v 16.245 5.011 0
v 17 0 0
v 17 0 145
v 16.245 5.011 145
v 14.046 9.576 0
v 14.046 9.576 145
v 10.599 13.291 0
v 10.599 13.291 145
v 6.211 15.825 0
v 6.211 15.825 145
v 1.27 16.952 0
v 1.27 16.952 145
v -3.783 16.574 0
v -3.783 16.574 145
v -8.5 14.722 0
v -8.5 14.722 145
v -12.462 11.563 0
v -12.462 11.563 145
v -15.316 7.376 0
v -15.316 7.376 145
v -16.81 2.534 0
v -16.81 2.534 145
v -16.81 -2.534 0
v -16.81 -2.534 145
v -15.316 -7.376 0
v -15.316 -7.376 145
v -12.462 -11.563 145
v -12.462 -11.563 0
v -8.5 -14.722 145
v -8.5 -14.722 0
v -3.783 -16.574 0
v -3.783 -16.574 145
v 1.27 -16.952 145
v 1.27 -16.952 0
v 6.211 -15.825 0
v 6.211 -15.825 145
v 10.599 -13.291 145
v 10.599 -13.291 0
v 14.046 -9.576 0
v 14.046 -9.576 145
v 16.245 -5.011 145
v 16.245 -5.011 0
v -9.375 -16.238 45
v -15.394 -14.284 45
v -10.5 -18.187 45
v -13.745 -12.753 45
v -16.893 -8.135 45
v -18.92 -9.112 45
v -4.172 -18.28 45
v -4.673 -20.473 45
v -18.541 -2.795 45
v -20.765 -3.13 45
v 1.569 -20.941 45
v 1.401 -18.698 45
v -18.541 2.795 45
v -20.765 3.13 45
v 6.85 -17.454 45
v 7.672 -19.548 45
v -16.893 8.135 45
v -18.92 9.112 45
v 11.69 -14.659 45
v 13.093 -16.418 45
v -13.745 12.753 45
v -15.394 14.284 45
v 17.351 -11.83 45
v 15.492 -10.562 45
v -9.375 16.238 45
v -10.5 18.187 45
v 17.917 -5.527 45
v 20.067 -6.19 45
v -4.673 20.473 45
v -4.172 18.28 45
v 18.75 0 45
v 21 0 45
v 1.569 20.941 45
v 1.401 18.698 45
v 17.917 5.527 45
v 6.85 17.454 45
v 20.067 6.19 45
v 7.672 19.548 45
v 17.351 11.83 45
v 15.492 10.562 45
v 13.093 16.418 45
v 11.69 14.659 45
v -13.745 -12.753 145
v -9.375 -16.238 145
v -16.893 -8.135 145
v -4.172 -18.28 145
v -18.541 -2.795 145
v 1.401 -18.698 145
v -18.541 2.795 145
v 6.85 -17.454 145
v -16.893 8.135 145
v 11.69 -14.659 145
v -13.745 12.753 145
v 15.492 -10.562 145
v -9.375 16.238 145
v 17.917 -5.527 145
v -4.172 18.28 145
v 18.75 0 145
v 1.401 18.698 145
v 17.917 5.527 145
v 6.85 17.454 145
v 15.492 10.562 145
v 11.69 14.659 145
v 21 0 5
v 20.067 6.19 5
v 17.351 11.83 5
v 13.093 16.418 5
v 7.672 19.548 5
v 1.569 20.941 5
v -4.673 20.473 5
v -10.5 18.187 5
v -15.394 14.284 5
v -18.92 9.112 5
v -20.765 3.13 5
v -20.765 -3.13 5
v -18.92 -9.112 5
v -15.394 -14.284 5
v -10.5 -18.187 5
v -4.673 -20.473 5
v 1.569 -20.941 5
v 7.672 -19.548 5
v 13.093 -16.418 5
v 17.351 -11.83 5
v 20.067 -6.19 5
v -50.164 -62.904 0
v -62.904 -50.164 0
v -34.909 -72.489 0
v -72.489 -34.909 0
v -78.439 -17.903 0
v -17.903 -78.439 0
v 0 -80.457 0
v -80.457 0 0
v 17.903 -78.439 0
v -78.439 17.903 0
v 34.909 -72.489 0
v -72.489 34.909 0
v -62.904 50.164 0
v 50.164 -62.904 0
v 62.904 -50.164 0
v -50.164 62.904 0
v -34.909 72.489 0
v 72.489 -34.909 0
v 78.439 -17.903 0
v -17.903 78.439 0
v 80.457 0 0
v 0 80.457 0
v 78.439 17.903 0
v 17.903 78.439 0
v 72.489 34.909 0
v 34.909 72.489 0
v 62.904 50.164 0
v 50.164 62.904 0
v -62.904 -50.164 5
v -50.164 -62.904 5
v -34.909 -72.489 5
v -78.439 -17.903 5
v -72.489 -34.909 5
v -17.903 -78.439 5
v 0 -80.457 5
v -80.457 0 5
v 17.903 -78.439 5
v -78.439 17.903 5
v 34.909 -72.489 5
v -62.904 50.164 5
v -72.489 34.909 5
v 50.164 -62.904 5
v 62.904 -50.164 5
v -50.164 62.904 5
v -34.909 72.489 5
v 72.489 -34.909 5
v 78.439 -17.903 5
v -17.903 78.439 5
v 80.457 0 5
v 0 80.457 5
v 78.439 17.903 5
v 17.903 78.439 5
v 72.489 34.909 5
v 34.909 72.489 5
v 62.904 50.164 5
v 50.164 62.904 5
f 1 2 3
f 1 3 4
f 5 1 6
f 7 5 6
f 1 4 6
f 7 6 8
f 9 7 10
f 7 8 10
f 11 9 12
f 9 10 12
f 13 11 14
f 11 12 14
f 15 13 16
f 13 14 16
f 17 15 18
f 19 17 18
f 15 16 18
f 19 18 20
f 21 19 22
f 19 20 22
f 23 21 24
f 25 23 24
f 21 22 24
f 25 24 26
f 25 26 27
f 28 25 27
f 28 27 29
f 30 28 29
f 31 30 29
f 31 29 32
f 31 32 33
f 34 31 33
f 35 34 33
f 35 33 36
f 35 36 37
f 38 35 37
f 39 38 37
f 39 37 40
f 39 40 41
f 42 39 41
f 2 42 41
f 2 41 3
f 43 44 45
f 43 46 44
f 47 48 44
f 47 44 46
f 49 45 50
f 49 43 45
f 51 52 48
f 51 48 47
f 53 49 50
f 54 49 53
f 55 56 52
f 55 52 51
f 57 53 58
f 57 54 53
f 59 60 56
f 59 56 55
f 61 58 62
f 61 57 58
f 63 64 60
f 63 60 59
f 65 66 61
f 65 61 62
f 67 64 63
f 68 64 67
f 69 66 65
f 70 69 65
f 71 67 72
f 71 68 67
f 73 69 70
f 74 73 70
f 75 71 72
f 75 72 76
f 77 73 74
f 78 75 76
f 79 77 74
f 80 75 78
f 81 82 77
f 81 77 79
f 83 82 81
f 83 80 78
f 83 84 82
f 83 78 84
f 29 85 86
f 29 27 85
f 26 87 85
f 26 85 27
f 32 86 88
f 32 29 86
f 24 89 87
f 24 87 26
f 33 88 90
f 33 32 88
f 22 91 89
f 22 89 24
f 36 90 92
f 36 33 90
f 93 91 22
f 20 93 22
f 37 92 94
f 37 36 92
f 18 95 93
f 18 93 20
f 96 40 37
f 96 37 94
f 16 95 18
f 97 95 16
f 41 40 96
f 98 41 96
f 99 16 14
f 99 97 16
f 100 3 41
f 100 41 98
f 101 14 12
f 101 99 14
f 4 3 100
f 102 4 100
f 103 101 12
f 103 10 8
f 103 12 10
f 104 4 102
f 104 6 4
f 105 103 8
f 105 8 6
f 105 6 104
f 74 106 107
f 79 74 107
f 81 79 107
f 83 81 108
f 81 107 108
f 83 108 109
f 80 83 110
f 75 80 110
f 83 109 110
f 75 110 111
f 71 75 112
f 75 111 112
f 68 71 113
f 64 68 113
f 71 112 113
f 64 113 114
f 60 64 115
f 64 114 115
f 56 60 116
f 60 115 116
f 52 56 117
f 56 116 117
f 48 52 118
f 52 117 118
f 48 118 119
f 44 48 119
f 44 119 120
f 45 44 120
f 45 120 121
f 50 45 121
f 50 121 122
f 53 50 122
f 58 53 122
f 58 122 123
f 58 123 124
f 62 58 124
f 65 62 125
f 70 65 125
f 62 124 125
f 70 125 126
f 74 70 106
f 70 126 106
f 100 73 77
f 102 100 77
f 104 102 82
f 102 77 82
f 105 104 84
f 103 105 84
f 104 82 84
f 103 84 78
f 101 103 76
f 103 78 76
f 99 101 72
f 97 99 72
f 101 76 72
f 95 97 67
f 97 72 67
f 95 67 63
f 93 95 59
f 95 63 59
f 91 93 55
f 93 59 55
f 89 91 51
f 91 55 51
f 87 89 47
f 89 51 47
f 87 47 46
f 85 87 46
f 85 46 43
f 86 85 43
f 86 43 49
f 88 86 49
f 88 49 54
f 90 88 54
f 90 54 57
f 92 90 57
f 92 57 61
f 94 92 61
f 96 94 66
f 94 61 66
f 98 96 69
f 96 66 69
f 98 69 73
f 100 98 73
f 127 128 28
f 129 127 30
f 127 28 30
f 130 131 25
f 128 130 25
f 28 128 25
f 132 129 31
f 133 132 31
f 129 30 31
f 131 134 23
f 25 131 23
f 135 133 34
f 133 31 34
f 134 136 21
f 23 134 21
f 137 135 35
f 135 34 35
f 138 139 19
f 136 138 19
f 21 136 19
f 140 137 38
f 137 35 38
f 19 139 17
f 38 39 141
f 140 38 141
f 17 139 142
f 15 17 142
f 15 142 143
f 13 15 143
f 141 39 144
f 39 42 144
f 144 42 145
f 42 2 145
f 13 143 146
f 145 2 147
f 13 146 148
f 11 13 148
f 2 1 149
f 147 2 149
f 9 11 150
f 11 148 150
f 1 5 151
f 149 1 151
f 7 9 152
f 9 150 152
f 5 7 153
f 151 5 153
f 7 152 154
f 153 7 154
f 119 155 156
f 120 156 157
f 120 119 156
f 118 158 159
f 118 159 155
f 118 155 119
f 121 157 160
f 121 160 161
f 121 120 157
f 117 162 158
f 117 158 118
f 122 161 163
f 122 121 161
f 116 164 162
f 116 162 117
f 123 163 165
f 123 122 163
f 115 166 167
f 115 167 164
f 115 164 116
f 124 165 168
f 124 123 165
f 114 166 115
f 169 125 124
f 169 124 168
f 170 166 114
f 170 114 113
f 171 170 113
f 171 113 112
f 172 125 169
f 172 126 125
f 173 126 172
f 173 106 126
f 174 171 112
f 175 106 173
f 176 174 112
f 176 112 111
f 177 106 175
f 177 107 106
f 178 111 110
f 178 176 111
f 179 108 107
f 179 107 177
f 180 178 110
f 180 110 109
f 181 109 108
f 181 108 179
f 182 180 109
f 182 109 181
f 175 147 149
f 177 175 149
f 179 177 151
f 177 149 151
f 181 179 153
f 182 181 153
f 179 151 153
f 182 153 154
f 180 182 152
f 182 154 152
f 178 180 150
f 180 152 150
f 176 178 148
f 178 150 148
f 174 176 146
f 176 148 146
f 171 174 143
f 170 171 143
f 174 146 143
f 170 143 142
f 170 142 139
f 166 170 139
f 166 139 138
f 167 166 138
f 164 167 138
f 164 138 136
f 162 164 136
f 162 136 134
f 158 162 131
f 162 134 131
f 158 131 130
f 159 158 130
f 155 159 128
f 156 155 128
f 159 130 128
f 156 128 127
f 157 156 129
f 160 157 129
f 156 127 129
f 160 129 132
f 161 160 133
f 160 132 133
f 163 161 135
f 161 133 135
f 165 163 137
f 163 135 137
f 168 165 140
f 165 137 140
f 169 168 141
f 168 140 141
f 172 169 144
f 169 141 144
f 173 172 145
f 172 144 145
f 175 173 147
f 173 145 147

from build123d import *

# Parameters (mm, degrees)
SKETCH019_R     = 80.456645
PAD008_DEPTH    = 5
SKETCH020_R     = 21
PAD009_DEPTH    = 40
SKETCH021_R     = 18.75
PAD010_DEPTH    = 100
SKETCH022_R     = 17
POCKET011_DEPTH = 145.001


with BuildPart() as part:
    # Sketch019 → Pad008 (new body)
    with BuildSketch(Plane.XY):
        Circle(SKETCH019_R)
    extrude(amount=PAD008_DEPTH)

    # Sketch020 (on Face3 of Pad008) → Pad009 (join)
    with BuildSketch(Plane.XY.offset(5)):
        Circle(SKETCH020_R)
    extrude(amount=PAD009_DEPTH)

    # Sketch021 (on Face5 of Pad009) → Pad010 (join)
    with BuildSketch(Plane.XY.offset(45)):
        Circle(SKETCH021_R)
    extrude(amount=PAD010_DEPTH)

    # Sketch022 (on Face7 of Pad010) → Pocket011 (cut, through all)
    with BuildSketch(Plane.XY.offset(145)):
        Circle(SKETCH022_R)
    extrude(amount=-POCKET011_DEPTH, mode=Mode.SUBTRACT)


solid = part.part
